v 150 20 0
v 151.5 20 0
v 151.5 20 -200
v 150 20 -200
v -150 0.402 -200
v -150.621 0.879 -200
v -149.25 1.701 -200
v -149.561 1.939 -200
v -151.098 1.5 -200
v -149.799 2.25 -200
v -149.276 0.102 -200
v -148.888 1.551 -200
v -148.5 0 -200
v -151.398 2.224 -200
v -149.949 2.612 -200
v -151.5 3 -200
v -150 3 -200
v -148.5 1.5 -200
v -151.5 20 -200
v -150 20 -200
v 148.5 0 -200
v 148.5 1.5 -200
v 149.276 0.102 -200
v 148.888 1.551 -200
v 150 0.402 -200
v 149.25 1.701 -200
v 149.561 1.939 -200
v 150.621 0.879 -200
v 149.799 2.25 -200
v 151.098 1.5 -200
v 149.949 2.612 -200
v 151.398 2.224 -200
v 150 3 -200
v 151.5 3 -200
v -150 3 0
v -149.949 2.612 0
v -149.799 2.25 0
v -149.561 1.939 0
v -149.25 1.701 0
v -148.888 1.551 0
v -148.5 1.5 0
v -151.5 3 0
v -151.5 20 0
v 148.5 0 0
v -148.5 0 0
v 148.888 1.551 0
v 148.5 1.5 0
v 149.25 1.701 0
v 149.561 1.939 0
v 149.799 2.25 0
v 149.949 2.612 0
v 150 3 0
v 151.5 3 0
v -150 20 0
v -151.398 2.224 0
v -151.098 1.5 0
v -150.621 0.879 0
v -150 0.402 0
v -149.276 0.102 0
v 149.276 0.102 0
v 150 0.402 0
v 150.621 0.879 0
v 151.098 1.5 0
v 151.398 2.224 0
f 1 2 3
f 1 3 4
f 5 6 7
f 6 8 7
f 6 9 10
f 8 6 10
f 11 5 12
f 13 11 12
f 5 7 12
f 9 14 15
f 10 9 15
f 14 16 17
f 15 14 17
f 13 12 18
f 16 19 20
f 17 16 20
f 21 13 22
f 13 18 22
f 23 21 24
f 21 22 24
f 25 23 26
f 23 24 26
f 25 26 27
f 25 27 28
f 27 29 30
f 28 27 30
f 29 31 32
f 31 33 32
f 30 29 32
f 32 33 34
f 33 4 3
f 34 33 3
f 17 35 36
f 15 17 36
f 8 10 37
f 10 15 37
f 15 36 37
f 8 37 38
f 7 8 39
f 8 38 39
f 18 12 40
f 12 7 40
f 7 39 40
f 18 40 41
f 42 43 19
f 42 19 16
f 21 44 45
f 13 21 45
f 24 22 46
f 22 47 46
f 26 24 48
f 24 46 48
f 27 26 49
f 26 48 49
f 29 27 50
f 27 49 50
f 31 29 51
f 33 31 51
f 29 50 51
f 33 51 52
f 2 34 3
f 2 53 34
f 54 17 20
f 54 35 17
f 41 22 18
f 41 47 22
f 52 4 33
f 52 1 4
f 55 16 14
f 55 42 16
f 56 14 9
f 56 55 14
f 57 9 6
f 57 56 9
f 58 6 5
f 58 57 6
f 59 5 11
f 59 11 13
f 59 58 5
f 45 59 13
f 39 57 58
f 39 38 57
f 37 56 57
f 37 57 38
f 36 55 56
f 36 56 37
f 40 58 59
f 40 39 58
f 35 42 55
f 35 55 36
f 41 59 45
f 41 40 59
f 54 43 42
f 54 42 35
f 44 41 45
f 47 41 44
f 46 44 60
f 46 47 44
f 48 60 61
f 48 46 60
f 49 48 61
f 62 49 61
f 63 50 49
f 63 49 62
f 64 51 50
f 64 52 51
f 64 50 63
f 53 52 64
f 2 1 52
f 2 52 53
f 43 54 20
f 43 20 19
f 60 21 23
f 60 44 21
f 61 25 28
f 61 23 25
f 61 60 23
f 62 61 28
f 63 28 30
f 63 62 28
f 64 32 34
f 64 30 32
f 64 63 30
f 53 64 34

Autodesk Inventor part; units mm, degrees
ref_plane "YZ Plane" through (0, 0, 0) normal (1, 0, 0) x (0, 1, 0)
ref_plane "XZ Plane" through (0, 0, 0) normal (0, 1, 0) x (-1, 0, 0)
ref_plane "XY Plane" through (0, 0, 0) normal (0, 0, 1) x (1, 0, 0)
sketch "Sketch1" plane through (0, 0, 0) normal (0, 1, 0) x (-1, 0, 0)
  line L0 (0, 0) -> (150, 0)
  line L1 (150, 0) -> (150, -200)
  line L2 (150, -200) -> (0, -200)
  line L3 (0, -200) -> (0, 0)
  dimension "d0" = 150
  dimension "d1" = 200
extrude "Plate1" add sketch "Sketch1" along normal blind 1.5
sketch "Sketch2" plane through (-150, 1.5, 0) normal (-1, 0, 0) x (0, -1, 0)
  line L0 (0, -200) -> (0, 0)
  line L1 (0, 0) -> (-18.5, 0)
  line L2 (-18.5, 0) -> (-18.5, -200)
  line L3 (-18.5, -200) -> (0, -200)
edge flange "Flange1" height 20 angle 90 thickness 1.5 bend radius 1.5 thickness toward (-1, 0, 0) relief tear relief width 1.5 relief depth 0.75 edges at (-150, 1.5, -100) wall of the first edge with corners at (-150, 1.5, -200) (-150, 1.5, 0) (-150, 20, 0) (-150, 20, -200)
bend "Bend1"
corner "Corner1"
mirror "Mirror1" about plane through (0, 0, -200) normal (1, 0, 0)
equation "\"d2\" = Thickness"
equation "\"d3\" = BendReliefWidth"
equation "\"d4\" = BendReliefDepth"
equation "\"d5\" = MinimumRemnant"
equation "\"d6\" = TransitionRadius"
equation "\"d9\" = BendRadius"
equation "\"d10\" = CornerReliefSize"
equation "\"d11\" = GapSize"
equation "\"d12\" = JacobiRadiusSize"
equation "\"BendRadius\" = Thickness"
equation "\"BendReliefWidth\" = Thickness"
equation "\"BendReliefDepth\" = 0.5 * Thickness"
equation "\"CornerReliefSize\" = 4 * Thickness"
equation "\"MinimumRemnant\" = 2 * Thickness"
equation "\"TransitionRadius\" = BendRadius"
equation "\"JacobiRadiusSize\" = BendRadius"
equation "\"GapSize\" = Thickness"
equation "\"Thickness\" = 1.5"
properties part number "Magazine bottom"
